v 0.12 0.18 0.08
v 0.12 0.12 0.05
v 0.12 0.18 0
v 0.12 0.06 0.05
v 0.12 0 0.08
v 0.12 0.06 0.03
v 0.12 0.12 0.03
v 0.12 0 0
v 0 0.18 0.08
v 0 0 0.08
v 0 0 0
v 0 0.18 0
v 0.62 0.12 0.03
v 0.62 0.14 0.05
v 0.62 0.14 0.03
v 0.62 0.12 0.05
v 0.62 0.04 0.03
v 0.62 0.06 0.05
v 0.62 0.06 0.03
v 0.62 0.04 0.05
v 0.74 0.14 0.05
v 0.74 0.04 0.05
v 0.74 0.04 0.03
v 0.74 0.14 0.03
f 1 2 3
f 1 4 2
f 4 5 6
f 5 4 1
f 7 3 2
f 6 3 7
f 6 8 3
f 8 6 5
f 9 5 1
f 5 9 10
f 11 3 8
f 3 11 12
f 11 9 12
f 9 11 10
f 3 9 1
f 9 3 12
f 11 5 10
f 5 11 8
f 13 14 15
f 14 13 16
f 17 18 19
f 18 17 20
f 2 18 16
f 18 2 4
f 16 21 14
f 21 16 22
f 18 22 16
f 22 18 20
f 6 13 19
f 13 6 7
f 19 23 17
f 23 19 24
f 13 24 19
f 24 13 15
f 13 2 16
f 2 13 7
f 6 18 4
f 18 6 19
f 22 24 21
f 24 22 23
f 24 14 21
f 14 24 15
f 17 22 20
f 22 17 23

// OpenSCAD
// FR : géométrie illustrative, unités mm, fonction non validée.
// EN: illustrative geometry, mm units, unvalidated function.
// ES: geometría ilustrativa, unidades mm, función no validada.
scale([1, 1, 1]) {
union() {
  cube([0.12, 0.18, 0.08]);
  translate([0.12, 0.06, 0.03]) cube([0.5, 0.06, 0.02]);
  translate([0.62, 0.04, 0.03]) cube([0.12, 0.1, 0.02]);
}
}
